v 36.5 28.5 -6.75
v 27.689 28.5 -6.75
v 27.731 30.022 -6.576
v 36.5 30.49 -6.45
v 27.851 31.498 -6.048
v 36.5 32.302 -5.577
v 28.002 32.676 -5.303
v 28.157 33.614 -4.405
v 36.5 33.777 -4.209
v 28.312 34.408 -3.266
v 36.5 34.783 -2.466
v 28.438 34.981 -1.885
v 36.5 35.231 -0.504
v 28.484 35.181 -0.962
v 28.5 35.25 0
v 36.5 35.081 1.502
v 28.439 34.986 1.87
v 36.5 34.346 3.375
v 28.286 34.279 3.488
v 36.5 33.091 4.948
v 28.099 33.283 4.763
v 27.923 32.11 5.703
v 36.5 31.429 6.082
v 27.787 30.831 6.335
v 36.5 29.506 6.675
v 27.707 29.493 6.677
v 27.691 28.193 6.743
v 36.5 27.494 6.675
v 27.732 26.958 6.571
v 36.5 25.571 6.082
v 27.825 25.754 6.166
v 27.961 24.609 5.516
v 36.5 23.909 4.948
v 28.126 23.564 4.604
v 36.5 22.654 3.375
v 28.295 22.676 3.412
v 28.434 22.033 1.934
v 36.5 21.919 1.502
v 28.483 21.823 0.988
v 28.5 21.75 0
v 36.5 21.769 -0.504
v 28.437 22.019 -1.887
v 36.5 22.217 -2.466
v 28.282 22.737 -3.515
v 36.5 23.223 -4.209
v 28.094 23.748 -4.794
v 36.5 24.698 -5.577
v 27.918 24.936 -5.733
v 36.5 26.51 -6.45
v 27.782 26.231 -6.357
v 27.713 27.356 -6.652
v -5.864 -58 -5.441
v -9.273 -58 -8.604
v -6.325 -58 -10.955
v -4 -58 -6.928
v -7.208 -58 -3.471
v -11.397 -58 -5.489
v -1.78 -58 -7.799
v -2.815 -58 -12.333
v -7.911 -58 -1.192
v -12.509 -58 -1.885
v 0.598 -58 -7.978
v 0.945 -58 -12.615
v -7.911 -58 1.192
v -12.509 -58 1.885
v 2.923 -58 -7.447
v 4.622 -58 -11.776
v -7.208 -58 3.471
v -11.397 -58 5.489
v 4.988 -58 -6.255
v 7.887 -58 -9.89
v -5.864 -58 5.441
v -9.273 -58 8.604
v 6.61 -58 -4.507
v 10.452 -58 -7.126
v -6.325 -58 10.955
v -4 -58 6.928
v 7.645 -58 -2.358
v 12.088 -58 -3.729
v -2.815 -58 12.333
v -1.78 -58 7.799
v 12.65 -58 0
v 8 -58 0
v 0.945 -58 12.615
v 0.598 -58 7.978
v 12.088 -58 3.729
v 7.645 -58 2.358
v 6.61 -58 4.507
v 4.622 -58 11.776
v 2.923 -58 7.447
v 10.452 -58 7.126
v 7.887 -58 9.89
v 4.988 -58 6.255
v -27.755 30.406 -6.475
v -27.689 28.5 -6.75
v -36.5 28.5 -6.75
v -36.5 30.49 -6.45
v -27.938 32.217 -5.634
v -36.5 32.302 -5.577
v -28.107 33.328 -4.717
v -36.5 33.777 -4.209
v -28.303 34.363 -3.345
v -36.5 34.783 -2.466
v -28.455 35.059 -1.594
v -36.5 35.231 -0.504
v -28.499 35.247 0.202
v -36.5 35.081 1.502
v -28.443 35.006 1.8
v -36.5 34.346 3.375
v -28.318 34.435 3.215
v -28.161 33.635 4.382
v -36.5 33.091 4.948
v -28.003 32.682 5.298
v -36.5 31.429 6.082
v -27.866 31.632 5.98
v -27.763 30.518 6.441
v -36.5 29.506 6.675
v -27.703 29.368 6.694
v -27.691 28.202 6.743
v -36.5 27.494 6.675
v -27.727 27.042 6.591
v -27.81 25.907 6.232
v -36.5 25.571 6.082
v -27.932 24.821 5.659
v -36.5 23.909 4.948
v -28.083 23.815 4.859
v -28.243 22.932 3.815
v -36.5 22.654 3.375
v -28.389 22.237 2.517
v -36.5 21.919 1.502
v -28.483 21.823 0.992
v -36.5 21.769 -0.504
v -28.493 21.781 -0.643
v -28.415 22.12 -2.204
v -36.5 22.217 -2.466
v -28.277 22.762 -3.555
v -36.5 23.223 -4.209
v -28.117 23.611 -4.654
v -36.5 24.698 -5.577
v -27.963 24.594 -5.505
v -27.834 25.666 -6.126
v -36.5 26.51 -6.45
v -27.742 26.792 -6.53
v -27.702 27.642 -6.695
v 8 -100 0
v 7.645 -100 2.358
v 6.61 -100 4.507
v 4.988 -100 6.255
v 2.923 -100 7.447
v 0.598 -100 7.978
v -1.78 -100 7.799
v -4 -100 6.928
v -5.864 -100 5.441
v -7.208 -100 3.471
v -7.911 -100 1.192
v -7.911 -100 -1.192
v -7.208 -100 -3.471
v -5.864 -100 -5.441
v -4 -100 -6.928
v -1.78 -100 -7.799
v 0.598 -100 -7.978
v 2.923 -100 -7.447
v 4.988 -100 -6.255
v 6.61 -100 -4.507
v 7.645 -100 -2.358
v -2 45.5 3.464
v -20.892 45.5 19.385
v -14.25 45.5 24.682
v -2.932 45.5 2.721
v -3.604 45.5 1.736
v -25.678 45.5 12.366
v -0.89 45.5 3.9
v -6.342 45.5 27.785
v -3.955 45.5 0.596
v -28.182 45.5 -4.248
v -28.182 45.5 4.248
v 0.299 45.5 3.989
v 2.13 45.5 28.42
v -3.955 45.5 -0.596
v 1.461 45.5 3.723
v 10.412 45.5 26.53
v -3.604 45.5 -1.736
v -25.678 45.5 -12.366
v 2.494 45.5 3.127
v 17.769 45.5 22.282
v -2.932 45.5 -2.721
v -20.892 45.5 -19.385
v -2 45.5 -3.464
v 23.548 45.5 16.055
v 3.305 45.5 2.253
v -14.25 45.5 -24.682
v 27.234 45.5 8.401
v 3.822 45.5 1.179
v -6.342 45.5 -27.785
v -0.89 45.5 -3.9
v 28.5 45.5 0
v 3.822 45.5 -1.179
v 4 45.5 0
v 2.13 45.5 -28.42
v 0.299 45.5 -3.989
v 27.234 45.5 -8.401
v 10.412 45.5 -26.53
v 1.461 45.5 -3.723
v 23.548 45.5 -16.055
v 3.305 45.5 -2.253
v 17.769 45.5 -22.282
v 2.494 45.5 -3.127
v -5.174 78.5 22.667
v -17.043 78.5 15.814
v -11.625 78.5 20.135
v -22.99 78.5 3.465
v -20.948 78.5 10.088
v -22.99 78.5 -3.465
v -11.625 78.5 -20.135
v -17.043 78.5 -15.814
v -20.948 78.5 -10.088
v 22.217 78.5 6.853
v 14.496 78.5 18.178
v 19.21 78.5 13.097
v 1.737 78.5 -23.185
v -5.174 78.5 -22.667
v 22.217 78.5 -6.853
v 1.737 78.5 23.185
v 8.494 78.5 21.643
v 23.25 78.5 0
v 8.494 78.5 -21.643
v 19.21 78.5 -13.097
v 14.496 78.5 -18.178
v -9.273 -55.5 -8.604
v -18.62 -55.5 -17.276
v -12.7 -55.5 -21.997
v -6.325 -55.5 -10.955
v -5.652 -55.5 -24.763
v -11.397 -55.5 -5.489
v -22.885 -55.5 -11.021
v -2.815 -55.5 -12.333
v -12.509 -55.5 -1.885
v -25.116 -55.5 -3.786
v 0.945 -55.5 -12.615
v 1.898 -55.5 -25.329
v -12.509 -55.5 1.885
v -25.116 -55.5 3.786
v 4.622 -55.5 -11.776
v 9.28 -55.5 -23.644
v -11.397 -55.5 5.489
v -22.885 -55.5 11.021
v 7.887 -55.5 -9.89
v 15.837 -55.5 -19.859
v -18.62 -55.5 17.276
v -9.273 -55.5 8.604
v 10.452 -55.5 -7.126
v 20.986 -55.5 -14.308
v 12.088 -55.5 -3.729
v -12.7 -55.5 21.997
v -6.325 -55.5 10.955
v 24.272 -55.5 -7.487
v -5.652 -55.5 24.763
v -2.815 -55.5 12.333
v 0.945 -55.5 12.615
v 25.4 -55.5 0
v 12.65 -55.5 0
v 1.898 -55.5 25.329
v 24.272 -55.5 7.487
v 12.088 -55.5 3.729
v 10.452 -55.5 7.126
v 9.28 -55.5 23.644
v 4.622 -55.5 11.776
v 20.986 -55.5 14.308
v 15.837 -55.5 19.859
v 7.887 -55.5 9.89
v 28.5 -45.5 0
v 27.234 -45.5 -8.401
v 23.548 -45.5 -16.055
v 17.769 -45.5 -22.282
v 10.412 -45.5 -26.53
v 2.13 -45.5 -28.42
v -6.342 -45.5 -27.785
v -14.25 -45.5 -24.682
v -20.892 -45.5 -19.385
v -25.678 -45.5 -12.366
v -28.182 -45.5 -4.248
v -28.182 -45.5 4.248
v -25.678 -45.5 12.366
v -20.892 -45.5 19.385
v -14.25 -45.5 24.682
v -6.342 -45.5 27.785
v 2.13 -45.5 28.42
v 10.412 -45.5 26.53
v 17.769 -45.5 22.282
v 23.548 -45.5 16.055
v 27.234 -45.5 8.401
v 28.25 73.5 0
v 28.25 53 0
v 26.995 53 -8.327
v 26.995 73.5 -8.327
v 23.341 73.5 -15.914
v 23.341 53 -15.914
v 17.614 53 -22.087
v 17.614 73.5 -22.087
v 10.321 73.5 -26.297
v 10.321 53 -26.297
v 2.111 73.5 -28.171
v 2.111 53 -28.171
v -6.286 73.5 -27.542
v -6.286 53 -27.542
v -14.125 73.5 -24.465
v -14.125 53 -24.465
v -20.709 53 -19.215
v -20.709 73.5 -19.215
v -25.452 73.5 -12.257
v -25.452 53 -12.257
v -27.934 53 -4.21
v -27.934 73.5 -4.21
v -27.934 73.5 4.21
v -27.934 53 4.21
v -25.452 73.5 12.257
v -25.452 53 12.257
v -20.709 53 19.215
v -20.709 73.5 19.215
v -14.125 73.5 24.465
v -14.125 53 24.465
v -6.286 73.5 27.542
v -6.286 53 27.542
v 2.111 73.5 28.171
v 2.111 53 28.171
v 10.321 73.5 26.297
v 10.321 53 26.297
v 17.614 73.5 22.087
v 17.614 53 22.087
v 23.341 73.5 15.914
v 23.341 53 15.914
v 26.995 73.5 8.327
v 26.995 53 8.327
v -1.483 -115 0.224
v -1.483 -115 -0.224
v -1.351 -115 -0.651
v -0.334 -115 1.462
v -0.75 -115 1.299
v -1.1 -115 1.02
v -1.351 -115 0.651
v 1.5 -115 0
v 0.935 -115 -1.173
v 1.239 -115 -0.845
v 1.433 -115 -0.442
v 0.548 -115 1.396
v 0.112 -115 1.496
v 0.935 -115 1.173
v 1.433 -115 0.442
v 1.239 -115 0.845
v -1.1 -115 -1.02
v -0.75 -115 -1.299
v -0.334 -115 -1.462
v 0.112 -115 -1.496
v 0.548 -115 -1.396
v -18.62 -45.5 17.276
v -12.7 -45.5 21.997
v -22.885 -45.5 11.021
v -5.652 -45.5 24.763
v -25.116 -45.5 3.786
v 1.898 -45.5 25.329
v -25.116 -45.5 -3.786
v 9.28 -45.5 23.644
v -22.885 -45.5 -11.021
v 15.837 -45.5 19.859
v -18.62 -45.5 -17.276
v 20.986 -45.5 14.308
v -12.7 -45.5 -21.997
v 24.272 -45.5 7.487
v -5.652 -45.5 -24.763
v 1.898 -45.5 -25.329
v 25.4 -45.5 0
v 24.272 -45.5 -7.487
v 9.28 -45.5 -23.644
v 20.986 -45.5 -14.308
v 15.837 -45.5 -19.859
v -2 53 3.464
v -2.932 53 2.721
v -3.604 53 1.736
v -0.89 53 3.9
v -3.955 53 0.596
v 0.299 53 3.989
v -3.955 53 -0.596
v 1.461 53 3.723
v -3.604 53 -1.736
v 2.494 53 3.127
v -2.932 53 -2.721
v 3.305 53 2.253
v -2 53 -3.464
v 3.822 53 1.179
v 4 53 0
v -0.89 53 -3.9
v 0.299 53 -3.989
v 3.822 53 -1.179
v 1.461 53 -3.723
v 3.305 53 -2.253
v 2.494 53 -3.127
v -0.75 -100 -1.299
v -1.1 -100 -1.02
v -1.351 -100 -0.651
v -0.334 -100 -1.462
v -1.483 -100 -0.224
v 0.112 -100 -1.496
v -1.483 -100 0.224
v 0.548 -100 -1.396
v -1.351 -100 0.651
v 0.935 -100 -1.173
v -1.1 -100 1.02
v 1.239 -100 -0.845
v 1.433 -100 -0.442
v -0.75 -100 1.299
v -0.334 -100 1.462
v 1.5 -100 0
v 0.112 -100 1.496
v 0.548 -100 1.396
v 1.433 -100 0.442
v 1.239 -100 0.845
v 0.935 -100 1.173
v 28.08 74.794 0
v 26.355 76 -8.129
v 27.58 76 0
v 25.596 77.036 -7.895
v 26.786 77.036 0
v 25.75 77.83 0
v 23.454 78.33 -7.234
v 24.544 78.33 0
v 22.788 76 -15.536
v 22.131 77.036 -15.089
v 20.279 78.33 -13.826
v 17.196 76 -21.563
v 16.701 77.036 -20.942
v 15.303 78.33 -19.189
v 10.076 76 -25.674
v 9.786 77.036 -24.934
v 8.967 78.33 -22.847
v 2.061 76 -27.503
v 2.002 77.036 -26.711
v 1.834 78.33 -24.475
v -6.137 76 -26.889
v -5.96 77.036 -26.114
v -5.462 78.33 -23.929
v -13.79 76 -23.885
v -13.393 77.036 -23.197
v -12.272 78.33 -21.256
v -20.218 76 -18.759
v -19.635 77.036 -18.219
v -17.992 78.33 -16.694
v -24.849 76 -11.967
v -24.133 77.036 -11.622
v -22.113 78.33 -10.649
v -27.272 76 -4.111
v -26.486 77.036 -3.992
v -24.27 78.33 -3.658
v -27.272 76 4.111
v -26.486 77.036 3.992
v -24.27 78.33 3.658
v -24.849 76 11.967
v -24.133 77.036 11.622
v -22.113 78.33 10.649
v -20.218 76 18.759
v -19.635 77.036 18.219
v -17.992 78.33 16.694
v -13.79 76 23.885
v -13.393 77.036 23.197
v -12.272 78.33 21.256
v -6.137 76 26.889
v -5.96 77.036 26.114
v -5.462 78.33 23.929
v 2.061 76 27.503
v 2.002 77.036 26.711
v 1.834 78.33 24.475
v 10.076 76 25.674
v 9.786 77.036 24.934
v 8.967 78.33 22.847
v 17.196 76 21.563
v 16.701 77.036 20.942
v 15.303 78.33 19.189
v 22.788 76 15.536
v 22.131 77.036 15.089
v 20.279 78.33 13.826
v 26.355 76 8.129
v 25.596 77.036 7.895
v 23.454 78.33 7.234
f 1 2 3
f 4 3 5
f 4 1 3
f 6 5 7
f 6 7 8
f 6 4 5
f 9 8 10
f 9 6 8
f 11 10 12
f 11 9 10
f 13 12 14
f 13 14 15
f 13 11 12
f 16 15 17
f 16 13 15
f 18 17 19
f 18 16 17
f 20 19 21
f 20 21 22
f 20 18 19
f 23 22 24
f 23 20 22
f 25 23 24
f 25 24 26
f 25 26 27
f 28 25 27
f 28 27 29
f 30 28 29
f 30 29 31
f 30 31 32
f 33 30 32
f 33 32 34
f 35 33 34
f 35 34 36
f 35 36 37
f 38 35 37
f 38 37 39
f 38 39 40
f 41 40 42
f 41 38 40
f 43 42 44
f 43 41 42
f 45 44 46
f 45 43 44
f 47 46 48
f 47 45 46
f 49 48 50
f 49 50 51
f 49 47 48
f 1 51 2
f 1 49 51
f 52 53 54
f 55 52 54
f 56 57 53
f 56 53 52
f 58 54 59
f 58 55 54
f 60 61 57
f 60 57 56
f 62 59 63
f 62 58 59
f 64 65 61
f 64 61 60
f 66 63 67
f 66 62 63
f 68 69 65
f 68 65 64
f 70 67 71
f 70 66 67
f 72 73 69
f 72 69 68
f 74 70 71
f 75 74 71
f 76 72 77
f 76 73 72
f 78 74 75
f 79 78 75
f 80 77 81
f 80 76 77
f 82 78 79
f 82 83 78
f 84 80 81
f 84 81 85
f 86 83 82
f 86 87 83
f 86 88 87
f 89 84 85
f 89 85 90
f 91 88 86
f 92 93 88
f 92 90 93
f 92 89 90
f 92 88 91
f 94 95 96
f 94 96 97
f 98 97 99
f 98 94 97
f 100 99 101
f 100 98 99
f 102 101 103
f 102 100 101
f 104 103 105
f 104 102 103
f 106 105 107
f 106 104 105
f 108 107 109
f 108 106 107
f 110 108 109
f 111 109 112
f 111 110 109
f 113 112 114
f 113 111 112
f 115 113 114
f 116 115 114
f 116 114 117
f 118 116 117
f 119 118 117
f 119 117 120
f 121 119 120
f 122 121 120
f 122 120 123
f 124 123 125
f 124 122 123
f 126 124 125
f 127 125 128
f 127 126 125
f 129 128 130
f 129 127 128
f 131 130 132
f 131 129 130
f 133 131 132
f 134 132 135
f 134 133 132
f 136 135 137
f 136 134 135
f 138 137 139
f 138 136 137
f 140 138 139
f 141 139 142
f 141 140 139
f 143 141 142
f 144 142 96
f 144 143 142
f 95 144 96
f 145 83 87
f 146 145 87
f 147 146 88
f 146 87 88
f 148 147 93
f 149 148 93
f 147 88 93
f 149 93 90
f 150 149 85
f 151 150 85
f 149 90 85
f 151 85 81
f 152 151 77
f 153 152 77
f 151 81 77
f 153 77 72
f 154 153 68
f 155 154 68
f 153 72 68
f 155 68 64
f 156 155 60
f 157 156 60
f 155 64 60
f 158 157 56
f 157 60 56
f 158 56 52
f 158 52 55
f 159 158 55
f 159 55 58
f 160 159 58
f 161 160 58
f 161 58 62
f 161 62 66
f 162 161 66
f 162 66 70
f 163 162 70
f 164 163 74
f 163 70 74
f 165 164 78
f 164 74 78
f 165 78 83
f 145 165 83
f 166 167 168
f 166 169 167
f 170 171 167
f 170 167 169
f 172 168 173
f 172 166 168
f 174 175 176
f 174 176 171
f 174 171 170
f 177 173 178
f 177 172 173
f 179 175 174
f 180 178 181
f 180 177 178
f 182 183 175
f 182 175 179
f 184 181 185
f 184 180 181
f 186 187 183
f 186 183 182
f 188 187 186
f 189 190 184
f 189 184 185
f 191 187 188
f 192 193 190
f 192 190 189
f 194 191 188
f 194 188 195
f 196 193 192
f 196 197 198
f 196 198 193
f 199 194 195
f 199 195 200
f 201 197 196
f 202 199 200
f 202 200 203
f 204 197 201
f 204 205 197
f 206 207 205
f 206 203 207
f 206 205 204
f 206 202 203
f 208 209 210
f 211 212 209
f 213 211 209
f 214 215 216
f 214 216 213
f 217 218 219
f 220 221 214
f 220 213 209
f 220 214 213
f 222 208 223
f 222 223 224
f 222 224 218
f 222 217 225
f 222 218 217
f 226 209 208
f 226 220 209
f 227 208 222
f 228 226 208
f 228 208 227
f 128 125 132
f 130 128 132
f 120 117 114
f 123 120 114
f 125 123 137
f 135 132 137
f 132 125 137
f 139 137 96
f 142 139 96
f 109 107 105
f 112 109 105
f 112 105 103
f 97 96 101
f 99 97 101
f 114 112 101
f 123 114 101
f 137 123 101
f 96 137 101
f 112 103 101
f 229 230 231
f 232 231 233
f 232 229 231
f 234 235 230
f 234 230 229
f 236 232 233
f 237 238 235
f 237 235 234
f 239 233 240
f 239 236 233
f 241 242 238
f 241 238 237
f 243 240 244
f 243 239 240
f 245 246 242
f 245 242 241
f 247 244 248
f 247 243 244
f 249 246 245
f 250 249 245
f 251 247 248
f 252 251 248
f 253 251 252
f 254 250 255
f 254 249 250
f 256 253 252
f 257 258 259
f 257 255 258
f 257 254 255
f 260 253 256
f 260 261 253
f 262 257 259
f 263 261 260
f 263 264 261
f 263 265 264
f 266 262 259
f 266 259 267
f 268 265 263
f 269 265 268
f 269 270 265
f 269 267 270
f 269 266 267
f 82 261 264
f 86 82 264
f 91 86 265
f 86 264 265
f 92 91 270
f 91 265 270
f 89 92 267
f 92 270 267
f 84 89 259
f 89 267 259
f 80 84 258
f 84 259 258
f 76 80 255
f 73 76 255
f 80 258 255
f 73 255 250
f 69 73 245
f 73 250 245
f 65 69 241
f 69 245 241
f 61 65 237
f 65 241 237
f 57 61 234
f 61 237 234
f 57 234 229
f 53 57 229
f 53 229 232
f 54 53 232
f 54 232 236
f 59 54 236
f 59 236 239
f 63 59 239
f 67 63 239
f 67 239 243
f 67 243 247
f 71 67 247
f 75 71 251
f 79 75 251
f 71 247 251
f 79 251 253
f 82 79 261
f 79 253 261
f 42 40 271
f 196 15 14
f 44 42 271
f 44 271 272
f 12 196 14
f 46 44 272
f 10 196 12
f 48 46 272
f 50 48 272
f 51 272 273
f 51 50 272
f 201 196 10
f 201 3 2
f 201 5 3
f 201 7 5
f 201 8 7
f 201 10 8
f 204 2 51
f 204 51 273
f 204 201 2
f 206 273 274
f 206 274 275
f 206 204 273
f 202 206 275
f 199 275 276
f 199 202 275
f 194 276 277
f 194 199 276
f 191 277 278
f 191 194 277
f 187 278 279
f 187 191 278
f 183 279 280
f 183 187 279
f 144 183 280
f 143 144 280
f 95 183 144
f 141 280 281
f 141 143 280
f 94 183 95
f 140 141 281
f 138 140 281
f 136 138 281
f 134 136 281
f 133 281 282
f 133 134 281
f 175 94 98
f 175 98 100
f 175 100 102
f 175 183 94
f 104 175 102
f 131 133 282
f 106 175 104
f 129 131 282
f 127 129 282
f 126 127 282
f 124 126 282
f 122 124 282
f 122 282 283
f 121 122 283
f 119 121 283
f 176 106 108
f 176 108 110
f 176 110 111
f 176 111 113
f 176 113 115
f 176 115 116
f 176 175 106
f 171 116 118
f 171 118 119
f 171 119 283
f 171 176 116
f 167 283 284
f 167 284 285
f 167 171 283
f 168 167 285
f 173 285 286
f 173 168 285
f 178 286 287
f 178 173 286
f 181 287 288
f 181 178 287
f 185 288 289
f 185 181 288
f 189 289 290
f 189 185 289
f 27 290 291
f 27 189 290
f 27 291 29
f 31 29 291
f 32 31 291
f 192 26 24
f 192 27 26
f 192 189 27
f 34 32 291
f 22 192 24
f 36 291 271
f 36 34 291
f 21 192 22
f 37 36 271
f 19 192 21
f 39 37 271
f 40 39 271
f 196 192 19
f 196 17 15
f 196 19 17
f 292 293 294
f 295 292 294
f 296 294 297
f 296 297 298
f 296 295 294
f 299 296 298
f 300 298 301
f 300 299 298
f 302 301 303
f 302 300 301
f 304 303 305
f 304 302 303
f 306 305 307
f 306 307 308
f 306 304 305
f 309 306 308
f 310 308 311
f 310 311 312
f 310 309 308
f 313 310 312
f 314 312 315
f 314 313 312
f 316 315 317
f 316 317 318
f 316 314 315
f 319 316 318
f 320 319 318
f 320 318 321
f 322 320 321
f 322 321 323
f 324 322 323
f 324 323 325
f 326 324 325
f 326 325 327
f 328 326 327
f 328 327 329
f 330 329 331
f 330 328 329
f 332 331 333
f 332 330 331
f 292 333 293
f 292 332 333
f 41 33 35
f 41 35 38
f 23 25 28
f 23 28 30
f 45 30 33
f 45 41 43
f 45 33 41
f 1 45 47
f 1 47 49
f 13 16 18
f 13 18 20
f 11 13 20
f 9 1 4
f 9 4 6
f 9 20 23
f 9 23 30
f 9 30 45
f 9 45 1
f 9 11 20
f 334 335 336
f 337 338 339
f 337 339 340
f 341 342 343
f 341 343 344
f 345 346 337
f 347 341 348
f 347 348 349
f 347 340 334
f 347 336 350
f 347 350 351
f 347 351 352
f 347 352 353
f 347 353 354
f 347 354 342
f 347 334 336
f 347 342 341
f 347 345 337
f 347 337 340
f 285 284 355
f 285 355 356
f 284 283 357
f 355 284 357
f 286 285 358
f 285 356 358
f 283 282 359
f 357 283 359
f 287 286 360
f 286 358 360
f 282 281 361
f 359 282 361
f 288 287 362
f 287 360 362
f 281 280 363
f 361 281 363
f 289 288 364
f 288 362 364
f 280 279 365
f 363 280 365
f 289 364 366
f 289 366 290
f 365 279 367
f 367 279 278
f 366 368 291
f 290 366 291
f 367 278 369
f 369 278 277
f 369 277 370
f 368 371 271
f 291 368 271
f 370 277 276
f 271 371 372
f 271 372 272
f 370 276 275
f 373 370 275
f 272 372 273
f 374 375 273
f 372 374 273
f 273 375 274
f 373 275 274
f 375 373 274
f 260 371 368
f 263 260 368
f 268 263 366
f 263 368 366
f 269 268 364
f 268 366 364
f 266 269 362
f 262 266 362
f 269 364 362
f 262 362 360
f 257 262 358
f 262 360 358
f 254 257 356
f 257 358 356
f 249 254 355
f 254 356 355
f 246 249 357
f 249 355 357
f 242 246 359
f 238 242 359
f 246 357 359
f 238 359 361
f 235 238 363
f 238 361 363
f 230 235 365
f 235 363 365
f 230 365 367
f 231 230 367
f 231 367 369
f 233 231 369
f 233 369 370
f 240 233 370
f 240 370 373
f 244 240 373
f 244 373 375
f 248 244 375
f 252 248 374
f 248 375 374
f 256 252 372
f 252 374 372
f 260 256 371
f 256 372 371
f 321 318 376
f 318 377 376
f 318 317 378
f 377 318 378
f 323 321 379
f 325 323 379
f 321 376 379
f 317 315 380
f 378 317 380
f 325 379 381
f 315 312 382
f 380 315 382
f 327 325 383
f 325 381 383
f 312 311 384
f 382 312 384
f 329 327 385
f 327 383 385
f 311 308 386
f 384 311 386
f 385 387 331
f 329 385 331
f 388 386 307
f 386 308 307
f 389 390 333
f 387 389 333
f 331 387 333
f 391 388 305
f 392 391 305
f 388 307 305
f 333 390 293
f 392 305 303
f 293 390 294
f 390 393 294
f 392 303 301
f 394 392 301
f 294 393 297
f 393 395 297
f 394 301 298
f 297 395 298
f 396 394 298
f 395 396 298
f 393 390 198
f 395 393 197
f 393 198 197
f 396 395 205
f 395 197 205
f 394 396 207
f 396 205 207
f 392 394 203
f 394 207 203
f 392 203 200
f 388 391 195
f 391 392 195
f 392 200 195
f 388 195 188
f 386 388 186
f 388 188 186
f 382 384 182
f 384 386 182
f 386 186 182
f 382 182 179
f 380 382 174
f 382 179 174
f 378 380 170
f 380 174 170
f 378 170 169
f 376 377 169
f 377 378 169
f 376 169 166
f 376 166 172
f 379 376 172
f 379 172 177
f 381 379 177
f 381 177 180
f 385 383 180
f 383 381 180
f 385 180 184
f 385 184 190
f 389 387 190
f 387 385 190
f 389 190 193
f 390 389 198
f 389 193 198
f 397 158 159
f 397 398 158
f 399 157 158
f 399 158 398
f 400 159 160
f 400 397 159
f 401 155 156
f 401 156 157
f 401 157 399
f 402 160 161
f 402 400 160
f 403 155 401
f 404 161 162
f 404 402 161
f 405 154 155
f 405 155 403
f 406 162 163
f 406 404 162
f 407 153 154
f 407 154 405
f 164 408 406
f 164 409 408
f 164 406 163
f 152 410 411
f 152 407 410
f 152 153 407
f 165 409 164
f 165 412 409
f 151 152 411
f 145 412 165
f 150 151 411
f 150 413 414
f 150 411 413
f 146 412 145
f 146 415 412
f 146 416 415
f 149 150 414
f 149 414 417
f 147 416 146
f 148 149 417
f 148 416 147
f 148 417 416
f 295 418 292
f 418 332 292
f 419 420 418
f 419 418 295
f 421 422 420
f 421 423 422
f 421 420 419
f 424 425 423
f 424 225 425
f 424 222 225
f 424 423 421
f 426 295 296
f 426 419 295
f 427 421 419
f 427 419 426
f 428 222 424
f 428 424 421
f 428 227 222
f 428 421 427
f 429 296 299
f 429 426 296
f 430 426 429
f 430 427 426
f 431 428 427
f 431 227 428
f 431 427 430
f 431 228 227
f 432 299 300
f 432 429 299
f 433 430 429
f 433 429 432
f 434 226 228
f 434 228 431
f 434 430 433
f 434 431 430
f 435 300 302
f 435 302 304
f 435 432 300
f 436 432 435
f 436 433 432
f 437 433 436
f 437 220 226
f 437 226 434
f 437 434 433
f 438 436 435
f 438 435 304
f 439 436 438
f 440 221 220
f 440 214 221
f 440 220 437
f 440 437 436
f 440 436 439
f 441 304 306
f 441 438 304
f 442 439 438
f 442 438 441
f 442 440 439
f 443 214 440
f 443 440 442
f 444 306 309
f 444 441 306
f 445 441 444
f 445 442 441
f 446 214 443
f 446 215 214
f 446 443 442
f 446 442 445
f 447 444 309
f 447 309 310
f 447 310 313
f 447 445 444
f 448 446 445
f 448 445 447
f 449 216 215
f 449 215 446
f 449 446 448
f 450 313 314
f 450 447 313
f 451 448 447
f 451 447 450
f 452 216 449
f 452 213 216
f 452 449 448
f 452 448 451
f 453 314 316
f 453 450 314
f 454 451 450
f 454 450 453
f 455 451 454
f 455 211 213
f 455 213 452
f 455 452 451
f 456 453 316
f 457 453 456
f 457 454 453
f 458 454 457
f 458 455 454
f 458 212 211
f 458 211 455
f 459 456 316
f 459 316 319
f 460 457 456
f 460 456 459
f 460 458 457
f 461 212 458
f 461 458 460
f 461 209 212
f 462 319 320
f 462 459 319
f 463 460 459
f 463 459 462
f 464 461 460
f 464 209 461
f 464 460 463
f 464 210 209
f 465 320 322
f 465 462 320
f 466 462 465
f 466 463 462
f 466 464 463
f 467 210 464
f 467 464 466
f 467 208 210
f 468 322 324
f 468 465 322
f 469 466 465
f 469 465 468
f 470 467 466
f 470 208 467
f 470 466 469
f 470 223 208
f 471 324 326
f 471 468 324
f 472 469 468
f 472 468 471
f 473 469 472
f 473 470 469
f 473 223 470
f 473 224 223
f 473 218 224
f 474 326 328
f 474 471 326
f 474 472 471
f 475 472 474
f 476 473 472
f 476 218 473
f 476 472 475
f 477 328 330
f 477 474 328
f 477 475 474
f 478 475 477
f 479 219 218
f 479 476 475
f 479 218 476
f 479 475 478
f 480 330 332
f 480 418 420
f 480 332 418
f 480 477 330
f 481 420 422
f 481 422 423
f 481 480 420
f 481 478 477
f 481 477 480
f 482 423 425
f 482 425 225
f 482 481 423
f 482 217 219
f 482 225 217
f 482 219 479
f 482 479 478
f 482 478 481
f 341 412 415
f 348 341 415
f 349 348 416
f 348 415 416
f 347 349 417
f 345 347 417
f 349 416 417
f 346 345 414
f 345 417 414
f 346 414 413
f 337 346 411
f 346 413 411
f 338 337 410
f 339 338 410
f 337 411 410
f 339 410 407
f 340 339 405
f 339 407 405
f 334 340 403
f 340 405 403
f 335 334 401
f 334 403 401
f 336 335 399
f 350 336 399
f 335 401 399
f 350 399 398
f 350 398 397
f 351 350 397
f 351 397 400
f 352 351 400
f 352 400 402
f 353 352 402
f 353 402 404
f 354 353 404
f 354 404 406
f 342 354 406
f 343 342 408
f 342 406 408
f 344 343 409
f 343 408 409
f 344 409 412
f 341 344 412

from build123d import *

# Parameters (mm, degrees)
SKETCH1_R           = 28.5
BOSS_EXTRUDE1_DEPTH = 45.5
SKETCH4_R           = 25.4
BOSS_EXTRUDE4_DEPTH = 10
SKETCH5_R           = 12.65
BOSS_EXTRUDE5_DEPTH = 2.5
SKETCH2_R           = 8
BOSS_EXTRUDE2_DEPTH = 42
SKETCH6_R           = 4
BOSS_EXTRUDE6_DEPTH = 33
SKETCH7_R           = 28.25
BOSS_EXTRUDE7_DEPTH = 25.5
FILLET1_R           = 5
SKETCH3_R           = 1.5
BOSS_EXTRUDE3_DEPTH = 15
SKETCH8_R           = 6.75
BOSS_EXTRUDE8_DEPTH = 36.5


with BuildPart() as part:
    # Sketch1 → Boss-Extrude1 (new body, symmetric)
    with BuildSketch(Plane(origin=(0, 0, 0), x_dir=(1, 0, 0), z_dir=(0, 1, 0))):
        Circle(SKETCH1_R)
    extrude(amount=BOSS_EXTRUDE1_DEPTH, both=True)

    # Sketch4 → Boss-Extrude4 (add)
    with BuildSketch(Plane.XZ.offset(45.5)):
        Circle(SKETCH4_R)
    extrude(amount=BOSS_EXTRUDE4_DEPTH)

    # Sketch5 → Boss-Extrude5 (add)
    with BuildSketch(Plane.XZ.offset(55.5)):
        Circle(SKETCH5_R)
    extrude(amount=BOSS_EXTRUDE5_DEPTH)

    # Sketch2 → Boss-Extrude2 (add)
    with BuildSketch(Plane.XZ.offset(58)):
        Circle(SKETCH2_R)
    extrude(amount=BOSS_EXTRUDE2_DEPTH)

    # Sketch6 → Boss-Extrude6 (add)
    with BuildSketch(Plane(origin=(0, 45.5, 0), x_dir=(1, 0, 0), z_dir=(0, 1, 0))):
        Circle(SKETCH6_R)
    extrude(amount=BOSS_EXTRUDE6_DEPTH)

    # Sketch7 → Boss-Extrude7 (add)
    with BuildSketch(Plane(origin=(0, 78.5, 0), x_dir=(1, 0, 0), z_dir=(0, 1, 0))):
        Circle(SKETCH7_R)
    extrude(amount=-BOSS_EXTRUDE7_DEPTH)

    # Fillet1
    fillet1_edges = [part.edges().sort_by_distance(p)[0] for p in [
        (-28.25, 78.5, 0),
    ]]
    fillet(fillet1_edges, radius=FILLET1_R)

    # Sketch3 → Boss-Extrude3 (add)
    with BuildSketch(Plane.XZ.offset(100)):
        Circle(SKETCH3_R)
    extrude(amount=BOSS_EXTRUDE3_DEPTH)

    # Sketch8 → Boss-Extrude8 (add, symmetric)
    with BuildSketch(Plane(origin=(0, 0, 0), x_dir=(0, 0, -1), z_dir=(1, 0, 0))):
        with Locations((0, 28.5)):
            Circle(SKETCH8_R)
    extrude(amount=BOSS_EXTRUDE8_DEPTH, both=True)


solid = part.part
